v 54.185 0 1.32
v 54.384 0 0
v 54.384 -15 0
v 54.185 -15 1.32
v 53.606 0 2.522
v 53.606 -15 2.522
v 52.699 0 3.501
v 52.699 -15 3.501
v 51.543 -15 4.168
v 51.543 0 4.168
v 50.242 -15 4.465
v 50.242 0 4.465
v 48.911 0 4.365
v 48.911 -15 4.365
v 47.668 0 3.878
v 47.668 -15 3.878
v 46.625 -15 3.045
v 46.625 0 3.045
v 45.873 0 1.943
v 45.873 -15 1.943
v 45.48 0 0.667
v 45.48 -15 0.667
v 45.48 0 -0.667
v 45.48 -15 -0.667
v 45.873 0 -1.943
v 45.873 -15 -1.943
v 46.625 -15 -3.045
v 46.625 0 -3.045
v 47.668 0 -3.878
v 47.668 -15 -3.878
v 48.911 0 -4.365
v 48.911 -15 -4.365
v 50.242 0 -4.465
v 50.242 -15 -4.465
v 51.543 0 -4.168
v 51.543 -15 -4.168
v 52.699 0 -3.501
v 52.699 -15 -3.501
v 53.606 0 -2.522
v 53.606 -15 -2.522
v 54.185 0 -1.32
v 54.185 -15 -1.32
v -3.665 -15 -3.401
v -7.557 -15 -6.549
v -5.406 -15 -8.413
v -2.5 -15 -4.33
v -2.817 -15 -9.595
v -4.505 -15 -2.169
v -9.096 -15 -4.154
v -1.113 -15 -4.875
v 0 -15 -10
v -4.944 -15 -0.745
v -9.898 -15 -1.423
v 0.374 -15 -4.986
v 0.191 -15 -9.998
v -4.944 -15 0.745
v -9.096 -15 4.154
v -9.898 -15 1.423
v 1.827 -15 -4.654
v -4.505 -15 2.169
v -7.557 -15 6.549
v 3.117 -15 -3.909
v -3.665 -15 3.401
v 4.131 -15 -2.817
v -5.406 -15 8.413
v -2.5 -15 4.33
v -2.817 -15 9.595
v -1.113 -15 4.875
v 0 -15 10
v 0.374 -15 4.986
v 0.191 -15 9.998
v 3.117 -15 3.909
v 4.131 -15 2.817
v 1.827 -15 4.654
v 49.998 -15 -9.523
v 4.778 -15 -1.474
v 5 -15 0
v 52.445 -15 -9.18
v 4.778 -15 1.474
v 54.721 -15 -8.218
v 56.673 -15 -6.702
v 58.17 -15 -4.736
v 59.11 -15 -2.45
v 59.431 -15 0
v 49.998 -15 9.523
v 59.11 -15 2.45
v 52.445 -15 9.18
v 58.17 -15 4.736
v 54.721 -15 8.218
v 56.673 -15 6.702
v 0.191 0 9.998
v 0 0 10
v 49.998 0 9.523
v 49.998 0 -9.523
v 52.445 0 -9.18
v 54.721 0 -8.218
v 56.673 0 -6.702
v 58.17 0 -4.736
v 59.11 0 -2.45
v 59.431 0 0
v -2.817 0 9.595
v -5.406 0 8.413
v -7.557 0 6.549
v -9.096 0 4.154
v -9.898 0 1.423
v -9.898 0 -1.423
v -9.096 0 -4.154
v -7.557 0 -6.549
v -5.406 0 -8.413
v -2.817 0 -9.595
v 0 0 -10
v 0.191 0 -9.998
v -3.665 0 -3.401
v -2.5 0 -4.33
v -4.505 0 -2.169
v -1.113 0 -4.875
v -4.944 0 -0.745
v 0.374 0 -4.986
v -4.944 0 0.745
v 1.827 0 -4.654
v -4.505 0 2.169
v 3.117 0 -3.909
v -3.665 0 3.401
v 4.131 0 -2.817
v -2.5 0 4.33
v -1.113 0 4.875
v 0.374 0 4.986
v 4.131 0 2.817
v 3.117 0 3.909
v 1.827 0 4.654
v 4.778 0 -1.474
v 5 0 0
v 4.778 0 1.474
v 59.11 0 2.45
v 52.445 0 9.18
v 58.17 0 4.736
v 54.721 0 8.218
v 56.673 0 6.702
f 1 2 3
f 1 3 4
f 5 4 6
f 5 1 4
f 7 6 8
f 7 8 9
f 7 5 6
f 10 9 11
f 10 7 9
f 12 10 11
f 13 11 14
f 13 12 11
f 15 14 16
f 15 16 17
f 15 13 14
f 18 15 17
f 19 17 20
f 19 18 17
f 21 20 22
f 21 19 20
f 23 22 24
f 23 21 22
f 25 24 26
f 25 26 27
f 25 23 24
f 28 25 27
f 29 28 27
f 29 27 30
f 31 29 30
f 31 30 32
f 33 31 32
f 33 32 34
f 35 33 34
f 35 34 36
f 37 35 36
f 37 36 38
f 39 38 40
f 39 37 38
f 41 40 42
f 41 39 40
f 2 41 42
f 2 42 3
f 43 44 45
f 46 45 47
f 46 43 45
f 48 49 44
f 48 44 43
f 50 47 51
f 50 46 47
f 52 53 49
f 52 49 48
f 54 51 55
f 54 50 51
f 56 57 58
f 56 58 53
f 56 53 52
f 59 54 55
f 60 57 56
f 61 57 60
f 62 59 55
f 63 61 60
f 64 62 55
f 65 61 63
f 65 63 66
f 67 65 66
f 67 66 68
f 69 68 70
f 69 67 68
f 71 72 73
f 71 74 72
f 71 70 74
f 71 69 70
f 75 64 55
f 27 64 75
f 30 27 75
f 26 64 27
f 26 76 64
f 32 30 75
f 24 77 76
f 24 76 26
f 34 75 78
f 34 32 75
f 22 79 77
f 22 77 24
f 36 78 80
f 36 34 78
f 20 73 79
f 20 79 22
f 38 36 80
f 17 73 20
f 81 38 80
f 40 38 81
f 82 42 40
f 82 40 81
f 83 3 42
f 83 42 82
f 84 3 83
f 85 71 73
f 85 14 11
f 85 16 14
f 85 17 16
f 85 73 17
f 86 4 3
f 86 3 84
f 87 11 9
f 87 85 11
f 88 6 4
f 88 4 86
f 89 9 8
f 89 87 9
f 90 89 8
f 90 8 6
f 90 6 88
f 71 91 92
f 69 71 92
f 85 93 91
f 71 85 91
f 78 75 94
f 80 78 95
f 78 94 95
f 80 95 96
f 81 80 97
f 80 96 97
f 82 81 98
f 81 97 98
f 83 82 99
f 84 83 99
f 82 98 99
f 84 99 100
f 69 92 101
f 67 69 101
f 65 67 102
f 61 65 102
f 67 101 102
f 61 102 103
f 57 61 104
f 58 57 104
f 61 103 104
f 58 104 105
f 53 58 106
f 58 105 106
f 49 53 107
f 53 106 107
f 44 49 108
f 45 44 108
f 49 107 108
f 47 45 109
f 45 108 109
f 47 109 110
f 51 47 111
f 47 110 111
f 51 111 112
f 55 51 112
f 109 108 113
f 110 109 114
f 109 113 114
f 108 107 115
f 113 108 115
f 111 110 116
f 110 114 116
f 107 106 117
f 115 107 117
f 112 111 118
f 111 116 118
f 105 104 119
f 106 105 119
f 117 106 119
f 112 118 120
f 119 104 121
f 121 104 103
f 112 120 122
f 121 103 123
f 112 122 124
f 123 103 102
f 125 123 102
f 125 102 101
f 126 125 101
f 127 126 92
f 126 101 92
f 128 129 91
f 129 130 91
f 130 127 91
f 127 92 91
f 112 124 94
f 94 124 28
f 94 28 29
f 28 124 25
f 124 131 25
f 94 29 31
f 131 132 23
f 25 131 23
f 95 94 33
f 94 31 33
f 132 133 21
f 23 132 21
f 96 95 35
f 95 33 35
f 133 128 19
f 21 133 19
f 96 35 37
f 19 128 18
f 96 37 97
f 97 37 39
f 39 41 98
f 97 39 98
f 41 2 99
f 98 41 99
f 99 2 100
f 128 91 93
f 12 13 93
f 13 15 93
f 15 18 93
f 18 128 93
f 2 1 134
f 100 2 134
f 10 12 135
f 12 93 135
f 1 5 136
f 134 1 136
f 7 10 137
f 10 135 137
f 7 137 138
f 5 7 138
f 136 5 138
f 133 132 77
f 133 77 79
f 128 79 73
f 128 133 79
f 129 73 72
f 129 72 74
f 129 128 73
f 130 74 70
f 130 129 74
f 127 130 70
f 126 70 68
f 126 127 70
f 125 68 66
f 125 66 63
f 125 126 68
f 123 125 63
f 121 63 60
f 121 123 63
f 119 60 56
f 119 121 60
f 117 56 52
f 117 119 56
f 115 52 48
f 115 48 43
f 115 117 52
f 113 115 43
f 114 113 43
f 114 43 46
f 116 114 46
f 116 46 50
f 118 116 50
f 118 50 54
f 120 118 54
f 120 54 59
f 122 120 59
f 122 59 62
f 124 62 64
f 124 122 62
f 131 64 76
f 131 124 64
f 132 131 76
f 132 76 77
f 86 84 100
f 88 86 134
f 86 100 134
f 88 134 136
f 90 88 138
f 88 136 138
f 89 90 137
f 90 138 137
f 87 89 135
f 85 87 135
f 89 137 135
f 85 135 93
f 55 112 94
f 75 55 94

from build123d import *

# Parameters (mm, degrees)
F0_R     = 5
F0_R_2   = 4.4774041187
F1_DEPTH = 15


with BuildPart() as f1:
    # F0 (on Front) → F1 (new body)
    with BuildSketch(Plane.XZ):
        with BuildLine():
            Line((49.9977292464, 9.523481164), (0.1905988779, 9.9981834384))
            ThreePointArc((0.1905988779, 9.9981834384), (7.1381366189, 7.0033567388), (10, 0))
            ThreePointArc((10, 0), (7.1381366189, -7.0033567388), (0.1905988779, -9.9981834384))
            Line((0.1905988779, -9.9981834384), (49.9977292464, -9.523481164))
            ThreePointArc((49.9977292464, -9.523481164), (40.3830490678, 0), (49.9977292464, 9.523481164))
        make_face()
        with BuildLine():
            Line((0.1905988779, 9.9981834384), (0, 10))
            ThreePointArc((0, 10), (-10, 0), (0, -10))
            Line((0, -10), (0.1905988779, -9.9981834384))
            ThreePointArc((0.1905988779, -9.9981834384), (7.1381366189, -7.0033567388), (10, 0))
            ThreePointArc((10, 0), (7.1381366189, 7.0033567388), (0.1905988779, 9.9981834384))
        make_face()
        Circle(F0_R, mode=Mode.SUBTRACT)
        with BuildLine():
            ThreePointArc((59.4308764543, 0), (56.6734014185, 6.7022563314), (49.9977292464, 9.523481164))
            ThreePointArc((49.9977292464, 9.523481164), (40.3830490678, 0), (49.9977292464, -9.523481164))
            ThreePointArc((49.9977292464, -9.523481164), (56.6734014185, -6.7022563314), (59.4308764543, 0))
        make_face()
        with Locations((49.9069627611, 0)):
            Circle(F0_R_2, mode=Mode.SUBTRACT)
    extrude(amount=F1_DEPTH)


solid = f1.part
